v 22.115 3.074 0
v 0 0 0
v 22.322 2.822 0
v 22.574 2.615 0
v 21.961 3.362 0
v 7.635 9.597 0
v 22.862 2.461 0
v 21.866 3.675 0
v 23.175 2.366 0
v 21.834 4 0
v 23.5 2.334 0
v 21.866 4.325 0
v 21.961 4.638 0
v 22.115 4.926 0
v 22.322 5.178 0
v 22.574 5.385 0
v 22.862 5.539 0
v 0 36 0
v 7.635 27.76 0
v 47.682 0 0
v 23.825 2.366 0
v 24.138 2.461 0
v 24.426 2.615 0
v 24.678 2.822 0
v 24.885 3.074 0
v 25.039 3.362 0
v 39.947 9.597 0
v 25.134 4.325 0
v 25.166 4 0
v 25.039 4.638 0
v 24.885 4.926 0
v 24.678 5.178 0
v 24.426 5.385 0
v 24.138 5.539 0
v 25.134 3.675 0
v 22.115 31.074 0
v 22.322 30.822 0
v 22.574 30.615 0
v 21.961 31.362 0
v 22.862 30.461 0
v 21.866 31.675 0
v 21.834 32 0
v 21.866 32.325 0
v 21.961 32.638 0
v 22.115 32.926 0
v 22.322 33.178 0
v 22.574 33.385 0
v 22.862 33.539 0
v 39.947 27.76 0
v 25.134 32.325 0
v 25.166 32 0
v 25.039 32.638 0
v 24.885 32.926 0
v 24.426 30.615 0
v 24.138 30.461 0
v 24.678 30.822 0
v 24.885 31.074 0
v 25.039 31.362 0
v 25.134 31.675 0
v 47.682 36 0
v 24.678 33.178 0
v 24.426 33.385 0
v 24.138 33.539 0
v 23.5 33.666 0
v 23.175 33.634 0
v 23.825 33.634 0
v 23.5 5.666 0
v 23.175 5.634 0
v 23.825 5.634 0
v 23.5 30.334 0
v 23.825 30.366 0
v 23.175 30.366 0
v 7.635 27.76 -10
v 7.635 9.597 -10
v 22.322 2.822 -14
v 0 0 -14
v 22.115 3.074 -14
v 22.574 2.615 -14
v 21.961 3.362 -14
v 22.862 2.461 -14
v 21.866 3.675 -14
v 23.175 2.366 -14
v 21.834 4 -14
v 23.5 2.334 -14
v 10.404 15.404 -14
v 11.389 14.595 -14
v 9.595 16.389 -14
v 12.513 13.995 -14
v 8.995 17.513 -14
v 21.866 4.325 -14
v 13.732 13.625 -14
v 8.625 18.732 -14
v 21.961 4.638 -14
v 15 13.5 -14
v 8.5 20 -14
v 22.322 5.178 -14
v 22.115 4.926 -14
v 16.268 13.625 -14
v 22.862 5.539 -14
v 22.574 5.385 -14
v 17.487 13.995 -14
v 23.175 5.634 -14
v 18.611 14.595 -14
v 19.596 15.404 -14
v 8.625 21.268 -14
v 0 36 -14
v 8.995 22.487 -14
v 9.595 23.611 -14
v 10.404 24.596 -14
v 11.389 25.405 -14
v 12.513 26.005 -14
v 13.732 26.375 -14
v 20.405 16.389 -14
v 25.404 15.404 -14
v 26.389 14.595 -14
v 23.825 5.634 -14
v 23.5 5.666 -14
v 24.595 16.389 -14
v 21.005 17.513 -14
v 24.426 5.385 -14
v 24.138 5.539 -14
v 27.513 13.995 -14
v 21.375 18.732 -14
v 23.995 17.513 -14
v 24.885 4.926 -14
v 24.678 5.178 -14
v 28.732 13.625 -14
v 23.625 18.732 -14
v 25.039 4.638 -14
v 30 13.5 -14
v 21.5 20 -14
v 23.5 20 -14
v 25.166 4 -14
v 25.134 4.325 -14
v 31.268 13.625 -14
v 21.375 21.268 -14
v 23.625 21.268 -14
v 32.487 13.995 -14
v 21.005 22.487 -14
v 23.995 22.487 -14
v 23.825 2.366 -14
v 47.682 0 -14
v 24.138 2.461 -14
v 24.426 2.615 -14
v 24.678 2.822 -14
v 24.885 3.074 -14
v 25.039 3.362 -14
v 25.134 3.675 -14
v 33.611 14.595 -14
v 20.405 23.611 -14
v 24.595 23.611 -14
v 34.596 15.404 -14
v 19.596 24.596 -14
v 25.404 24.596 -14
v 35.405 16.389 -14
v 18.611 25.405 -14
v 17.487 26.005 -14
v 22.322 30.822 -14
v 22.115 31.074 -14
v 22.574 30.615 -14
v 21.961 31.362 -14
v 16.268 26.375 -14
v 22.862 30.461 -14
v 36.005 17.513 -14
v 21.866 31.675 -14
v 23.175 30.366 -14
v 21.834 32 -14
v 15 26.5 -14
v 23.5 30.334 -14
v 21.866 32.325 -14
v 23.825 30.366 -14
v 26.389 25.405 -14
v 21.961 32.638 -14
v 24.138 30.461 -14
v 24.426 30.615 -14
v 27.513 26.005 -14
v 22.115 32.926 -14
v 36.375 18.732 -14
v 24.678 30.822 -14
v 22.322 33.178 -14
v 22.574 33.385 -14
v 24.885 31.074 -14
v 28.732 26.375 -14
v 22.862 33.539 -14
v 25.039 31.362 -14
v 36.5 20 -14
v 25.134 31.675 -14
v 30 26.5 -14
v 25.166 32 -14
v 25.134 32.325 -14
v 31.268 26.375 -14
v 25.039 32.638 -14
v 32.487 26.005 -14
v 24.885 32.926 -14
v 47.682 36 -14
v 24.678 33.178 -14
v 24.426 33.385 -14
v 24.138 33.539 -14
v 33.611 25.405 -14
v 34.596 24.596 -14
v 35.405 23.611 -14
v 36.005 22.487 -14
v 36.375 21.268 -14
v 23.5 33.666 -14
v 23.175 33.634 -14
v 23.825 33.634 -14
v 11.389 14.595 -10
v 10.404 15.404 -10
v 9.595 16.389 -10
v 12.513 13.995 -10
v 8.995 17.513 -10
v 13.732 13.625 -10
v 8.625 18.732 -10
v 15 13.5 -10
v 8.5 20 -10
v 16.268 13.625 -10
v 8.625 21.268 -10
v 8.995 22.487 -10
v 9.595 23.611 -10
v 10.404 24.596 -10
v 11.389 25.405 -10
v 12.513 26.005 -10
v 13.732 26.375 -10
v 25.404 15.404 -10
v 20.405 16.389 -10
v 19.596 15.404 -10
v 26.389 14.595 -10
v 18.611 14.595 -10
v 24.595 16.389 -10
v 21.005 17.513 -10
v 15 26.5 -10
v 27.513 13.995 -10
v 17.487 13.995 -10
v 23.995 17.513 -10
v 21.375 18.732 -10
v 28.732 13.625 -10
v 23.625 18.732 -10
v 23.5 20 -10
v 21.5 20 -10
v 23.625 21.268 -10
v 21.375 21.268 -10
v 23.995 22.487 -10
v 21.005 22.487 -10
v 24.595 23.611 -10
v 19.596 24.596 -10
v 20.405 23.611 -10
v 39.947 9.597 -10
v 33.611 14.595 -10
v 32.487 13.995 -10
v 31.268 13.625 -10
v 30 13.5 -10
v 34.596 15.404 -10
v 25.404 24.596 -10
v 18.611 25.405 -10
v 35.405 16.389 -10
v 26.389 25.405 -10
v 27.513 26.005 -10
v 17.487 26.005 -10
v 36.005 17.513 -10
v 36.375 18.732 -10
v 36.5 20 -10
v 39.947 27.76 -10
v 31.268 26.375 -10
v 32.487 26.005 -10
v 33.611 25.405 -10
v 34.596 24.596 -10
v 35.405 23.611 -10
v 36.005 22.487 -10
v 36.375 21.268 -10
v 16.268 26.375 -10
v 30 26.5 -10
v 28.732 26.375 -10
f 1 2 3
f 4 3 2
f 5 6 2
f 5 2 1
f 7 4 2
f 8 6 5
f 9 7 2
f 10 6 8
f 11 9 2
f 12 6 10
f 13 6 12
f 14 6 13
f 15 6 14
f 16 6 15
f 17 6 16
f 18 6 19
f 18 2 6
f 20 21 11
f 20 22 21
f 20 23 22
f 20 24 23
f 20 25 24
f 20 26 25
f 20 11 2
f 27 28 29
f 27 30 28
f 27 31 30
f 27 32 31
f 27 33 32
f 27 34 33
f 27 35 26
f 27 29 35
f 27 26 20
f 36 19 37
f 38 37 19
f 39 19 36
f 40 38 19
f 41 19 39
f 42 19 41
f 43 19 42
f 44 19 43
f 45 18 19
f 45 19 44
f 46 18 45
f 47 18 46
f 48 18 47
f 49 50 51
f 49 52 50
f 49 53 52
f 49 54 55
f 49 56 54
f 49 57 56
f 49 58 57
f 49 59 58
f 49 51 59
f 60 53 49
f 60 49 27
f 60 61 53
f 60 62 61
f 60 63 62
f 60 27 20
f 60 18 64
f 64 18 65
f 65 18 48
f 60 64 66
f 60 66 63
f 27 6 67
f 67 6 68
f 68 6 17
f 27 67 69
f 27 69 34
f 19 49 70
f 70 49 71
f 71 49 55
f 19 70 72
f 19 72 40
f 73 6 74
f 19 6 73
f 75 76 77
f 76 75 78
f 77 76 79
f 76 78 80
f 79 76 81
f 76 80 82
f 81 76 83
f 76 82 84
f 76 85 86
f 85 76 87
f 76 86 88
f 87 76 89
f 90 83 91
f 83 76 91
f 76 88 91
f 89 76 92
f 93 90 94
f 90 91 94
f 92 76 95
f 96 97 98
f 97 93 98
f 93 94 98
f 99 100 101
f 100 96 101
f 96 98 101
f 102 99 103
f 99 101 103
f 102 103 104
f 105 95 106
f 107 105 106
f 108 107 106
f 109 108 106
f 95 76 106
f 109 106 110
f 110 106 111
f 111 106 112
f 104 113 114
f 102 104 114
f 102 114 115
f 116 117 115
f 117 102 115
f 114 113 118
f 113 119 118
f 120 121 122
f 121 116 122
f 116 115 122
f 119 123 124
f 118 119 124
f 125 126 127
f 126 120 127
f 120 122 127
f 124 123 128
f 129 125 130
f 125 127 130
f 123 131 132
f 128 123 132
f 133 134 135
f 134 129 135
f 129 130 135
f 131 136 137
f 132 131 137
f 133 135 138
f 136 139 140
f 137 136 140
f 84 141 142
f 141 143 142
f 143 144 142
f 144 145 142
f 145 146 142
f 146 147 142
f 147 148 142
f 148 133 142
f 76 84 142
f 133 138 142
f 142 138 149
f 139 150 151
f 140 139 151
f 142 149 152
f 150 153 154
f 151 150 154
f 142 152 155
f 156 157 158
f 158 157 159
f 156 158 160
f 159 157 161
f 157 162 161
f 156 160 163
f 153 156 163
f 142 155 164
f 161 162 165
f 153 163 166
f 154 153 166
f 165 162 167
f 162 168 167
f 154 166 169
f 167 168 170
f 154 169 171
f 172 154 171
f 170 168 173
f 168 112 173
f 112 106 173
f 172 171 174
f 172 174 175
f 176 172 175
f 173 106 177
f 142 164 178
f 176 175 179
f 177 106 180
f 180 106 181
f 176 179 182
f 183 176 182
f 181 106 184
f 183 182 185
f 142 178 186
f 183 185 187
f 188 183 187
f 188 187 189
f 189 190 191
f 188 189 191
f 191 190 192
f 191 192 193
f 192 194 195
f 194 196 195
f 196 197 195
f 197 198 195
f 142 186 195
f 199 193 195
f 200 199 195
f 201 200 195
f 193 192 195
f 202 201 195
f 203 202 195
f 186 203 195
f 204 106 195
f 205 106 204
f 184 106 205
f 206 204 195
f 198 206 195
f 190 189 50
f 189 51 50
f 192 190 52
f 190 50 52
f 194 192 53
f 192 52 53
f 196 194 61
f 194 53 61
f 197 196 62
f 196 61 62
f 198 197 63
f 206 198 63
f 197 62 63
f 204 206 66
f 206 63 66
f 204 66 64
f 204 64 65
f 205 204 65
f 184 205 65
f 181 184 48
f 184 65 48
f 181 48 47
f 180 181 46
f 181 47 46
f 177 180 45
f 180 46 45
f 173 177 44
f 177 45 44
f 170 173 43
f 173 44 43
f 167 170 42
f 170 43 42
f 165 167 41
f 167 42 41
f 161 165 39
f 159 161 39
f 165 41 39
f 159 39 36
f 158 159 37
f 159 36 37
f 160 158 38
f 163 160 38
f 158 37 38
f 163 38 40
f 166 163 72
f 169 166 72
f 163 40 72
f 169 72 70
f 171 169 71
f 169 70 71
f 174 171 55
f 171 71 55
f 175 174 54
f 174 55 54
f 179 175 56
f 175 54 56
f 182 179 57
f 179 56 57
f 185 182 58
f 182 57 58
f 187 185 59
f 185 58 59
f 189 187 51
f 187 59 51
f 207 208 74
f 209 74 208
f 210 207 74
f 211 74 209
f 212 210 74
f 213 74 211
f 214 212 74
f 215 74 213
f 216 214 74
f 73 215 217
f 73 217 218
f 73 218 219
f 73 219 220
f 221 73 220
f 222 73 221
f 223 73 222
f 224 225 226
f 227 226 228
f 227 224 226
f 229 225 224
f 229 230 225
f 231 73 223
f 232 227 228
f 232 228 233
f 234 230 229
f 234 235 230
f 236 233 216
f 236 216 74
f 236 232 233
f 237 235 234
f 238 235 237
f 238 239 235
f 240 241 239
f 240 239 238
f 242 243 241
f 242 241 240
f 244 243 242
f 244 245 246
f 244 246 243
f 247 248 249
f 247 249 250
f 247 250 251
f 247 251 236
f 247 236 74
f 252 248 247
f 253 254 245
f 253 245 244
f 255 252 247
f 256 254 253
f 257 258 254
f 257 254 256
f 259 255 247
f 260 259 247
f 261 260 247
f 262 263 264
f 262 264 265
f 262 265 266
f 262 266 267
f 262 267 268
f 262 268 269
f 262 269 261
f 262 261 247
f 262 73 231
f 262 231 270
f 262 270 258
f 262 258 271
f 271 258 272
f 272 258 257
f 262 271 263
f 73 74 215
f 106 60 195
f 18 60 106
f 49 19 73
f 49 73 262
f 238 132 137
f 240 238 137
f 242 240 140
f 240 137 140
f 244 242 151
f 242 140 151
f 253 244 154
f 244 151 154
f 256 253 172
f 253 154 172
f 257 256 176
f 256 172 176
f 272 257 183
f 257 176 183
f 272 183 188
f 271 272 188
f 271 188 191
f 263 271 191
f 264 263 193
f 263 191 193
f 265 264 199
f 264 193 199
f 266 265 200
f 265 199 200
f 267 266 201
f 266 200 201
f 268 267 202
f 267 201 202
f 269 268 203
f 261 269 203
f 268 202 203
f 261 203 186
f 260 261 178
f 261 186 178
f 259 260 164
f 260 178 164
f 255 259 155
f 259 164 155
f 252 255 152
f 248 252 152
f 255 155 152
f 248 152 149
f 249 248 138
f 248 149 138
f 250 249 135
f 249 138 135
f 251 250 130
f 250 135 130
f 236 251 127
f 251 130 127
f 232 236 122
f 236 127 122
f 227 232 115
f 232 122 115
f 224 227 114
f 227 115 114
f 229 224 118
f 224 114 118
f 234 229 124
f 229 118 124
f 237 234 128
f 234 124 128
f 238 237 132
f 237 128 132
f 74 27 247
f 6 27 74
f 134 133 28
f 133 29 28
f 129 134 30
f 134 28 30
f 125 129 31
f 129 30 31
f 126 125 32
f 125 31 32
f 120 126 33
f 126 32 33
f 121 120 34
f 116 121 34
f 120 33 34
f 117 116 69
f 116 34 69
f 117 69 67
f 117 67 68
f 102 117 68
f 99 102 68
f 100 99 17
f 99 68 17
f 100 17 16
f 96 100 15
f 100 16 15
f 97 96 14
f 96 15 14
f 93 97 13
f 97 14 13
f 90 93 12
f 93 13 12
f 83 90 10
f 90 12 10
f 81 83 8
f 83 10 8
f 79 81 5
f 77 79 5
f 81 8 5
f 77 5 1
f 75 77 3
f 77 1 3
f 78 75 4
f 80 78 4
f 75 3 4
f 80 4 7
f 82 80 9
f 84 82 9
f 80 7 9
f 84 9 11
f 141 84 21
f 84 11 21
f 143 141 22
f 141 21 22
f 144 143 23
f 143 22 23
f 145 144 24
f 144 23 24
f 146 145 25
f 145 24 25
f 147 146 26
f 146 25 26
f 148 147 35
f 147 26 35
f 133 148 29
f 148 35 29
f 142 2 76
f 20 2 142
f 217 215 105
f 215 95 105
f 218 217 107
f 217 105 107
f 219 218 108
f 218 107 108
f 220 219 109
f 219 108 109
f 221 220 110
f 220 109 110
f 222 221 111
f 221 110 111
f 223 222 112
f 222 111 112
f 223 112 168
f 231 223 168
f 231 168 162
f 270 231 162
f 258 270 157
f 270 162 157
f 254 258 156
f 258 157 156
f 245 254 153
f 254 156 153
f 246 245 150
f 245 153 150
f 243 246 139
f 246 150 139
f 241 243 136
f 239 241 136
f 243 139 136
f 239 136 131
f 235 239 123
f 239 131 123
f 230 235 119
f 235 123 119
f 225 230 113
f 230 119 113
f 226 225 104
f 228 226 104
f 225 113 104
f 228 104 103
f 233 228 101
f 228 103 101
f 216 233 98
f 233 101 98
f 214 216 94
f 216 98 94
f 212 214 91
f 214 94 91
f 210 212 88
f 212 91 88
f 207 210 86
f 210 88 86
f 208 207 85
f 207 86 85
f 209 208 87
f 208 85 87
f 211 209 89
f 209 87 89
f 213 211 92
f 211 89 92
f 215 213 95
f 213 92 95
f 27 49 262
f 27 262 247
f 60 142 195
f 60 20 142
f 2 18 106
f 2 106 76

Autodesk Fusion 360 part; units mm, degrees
sketch "Boceto1" plane through (0, 0, 0) normal (0, 0, 1) x (1, 0, 0)
  line L0 (0, 0) -> (47.682, 0)
  line L1 (47.682, 0) -> (47.682, 36)
  line L2 (47.682, 36) -> (0, 36)
  line L3 (0, 36) -> (0, 0)
  line L4 (4.2944, 26.5117) -> (42.5805, 26.5117)
  line L5 (42.5805, 26.5117) -> (42.5805, 9.2899)
  line L6 (42.5805, 9.2899) -> (4.2944, 9.2899)
  line L7 (4.2944, 9.2899) -> (4.2944, 26.5117)
  circle A0 centre (23.5, 32) radius 2.25
  circle A1 centre (23.5, 4) radius 2.25
  dimension "d8" = 4.5
  dimension "d10" = 4.5
extrude "Extruir1" add sketch "Boceto1" against normal blind 14 contours L0 L1 L2 L3 | L4 L5 L6 L7
sketch "Boceto2" plane through (0, 0, 0) normal (0, 0, 1) x (1, 0, 0)
  circle A0 centre (23.5, 4) radius 2.25
  circle A1 centre (23.5, 32) radius 2.25
  line L0 (0, 36) -> (0, 0)
  line L1 (0, 0) -> (47.682, 0)
  line L2 (47.682, 0) -> (47.682, 36)
  line L3 (47.682, 36) -> (0, 36)
  line L4 (7.6346, 27.7605) -> (39.9467, 27.7605)
  line L5 (39.9467, 27.7605) -> (39.9467, 9.5968)
  line L6 (39.9467, 9.5968) -> (7.6346, 9.5968)
  line L7 (7.6346, 9.5968) -> (7.6346, 27.7605)
extrude "Extruir2" cut sketch "Boceto2" against normal blind 10 contours L4 L5 L6 L7
sketch "Boceto3" plane through (0, 0, -14) normal (0, 0, -1) x (-1, 0, 0)
  circle A0 centre (-23.5, 4) radius 2.25
  circle A1 centre (-23.5, 32) radius 2.25
  line L0 (0, 0) -> (0, 36)
  line L1 (0, 36) -> (-47.682, 36)
  line L2 (-47.682, 36) -> (-47.682, 0)
  line L3 (-47.682, 0) -> (0, 0)
  circle A2 centre (-30, 20) radius 6.5
  circle A3 centre (-15, 20) radius 6.5
  dimension "d25" = 13
  dimension "d26" = 13
extrude "Extruir3" cut sketch "Boceto3" against normal blind 25 contours A2 | A3
thread "Rosca1" "ISO Metric profile 4.0 M4x0.7 M4x0.7 6H" major diameter 4.1095 minor diameter 3.332 pitch 0.7 angle 60 resizes the face on face at (25.7388, 31.776, -9.3333)
thread "Rosca2" "ISO Metric profile 4.0 M4x0.7 M4x0.7 6H" major diameter 4.1095 minor diameter 3.332 pitch 0.7 angle 60 resizes the face on face at (25.7388, 3.776, -9.3333)
